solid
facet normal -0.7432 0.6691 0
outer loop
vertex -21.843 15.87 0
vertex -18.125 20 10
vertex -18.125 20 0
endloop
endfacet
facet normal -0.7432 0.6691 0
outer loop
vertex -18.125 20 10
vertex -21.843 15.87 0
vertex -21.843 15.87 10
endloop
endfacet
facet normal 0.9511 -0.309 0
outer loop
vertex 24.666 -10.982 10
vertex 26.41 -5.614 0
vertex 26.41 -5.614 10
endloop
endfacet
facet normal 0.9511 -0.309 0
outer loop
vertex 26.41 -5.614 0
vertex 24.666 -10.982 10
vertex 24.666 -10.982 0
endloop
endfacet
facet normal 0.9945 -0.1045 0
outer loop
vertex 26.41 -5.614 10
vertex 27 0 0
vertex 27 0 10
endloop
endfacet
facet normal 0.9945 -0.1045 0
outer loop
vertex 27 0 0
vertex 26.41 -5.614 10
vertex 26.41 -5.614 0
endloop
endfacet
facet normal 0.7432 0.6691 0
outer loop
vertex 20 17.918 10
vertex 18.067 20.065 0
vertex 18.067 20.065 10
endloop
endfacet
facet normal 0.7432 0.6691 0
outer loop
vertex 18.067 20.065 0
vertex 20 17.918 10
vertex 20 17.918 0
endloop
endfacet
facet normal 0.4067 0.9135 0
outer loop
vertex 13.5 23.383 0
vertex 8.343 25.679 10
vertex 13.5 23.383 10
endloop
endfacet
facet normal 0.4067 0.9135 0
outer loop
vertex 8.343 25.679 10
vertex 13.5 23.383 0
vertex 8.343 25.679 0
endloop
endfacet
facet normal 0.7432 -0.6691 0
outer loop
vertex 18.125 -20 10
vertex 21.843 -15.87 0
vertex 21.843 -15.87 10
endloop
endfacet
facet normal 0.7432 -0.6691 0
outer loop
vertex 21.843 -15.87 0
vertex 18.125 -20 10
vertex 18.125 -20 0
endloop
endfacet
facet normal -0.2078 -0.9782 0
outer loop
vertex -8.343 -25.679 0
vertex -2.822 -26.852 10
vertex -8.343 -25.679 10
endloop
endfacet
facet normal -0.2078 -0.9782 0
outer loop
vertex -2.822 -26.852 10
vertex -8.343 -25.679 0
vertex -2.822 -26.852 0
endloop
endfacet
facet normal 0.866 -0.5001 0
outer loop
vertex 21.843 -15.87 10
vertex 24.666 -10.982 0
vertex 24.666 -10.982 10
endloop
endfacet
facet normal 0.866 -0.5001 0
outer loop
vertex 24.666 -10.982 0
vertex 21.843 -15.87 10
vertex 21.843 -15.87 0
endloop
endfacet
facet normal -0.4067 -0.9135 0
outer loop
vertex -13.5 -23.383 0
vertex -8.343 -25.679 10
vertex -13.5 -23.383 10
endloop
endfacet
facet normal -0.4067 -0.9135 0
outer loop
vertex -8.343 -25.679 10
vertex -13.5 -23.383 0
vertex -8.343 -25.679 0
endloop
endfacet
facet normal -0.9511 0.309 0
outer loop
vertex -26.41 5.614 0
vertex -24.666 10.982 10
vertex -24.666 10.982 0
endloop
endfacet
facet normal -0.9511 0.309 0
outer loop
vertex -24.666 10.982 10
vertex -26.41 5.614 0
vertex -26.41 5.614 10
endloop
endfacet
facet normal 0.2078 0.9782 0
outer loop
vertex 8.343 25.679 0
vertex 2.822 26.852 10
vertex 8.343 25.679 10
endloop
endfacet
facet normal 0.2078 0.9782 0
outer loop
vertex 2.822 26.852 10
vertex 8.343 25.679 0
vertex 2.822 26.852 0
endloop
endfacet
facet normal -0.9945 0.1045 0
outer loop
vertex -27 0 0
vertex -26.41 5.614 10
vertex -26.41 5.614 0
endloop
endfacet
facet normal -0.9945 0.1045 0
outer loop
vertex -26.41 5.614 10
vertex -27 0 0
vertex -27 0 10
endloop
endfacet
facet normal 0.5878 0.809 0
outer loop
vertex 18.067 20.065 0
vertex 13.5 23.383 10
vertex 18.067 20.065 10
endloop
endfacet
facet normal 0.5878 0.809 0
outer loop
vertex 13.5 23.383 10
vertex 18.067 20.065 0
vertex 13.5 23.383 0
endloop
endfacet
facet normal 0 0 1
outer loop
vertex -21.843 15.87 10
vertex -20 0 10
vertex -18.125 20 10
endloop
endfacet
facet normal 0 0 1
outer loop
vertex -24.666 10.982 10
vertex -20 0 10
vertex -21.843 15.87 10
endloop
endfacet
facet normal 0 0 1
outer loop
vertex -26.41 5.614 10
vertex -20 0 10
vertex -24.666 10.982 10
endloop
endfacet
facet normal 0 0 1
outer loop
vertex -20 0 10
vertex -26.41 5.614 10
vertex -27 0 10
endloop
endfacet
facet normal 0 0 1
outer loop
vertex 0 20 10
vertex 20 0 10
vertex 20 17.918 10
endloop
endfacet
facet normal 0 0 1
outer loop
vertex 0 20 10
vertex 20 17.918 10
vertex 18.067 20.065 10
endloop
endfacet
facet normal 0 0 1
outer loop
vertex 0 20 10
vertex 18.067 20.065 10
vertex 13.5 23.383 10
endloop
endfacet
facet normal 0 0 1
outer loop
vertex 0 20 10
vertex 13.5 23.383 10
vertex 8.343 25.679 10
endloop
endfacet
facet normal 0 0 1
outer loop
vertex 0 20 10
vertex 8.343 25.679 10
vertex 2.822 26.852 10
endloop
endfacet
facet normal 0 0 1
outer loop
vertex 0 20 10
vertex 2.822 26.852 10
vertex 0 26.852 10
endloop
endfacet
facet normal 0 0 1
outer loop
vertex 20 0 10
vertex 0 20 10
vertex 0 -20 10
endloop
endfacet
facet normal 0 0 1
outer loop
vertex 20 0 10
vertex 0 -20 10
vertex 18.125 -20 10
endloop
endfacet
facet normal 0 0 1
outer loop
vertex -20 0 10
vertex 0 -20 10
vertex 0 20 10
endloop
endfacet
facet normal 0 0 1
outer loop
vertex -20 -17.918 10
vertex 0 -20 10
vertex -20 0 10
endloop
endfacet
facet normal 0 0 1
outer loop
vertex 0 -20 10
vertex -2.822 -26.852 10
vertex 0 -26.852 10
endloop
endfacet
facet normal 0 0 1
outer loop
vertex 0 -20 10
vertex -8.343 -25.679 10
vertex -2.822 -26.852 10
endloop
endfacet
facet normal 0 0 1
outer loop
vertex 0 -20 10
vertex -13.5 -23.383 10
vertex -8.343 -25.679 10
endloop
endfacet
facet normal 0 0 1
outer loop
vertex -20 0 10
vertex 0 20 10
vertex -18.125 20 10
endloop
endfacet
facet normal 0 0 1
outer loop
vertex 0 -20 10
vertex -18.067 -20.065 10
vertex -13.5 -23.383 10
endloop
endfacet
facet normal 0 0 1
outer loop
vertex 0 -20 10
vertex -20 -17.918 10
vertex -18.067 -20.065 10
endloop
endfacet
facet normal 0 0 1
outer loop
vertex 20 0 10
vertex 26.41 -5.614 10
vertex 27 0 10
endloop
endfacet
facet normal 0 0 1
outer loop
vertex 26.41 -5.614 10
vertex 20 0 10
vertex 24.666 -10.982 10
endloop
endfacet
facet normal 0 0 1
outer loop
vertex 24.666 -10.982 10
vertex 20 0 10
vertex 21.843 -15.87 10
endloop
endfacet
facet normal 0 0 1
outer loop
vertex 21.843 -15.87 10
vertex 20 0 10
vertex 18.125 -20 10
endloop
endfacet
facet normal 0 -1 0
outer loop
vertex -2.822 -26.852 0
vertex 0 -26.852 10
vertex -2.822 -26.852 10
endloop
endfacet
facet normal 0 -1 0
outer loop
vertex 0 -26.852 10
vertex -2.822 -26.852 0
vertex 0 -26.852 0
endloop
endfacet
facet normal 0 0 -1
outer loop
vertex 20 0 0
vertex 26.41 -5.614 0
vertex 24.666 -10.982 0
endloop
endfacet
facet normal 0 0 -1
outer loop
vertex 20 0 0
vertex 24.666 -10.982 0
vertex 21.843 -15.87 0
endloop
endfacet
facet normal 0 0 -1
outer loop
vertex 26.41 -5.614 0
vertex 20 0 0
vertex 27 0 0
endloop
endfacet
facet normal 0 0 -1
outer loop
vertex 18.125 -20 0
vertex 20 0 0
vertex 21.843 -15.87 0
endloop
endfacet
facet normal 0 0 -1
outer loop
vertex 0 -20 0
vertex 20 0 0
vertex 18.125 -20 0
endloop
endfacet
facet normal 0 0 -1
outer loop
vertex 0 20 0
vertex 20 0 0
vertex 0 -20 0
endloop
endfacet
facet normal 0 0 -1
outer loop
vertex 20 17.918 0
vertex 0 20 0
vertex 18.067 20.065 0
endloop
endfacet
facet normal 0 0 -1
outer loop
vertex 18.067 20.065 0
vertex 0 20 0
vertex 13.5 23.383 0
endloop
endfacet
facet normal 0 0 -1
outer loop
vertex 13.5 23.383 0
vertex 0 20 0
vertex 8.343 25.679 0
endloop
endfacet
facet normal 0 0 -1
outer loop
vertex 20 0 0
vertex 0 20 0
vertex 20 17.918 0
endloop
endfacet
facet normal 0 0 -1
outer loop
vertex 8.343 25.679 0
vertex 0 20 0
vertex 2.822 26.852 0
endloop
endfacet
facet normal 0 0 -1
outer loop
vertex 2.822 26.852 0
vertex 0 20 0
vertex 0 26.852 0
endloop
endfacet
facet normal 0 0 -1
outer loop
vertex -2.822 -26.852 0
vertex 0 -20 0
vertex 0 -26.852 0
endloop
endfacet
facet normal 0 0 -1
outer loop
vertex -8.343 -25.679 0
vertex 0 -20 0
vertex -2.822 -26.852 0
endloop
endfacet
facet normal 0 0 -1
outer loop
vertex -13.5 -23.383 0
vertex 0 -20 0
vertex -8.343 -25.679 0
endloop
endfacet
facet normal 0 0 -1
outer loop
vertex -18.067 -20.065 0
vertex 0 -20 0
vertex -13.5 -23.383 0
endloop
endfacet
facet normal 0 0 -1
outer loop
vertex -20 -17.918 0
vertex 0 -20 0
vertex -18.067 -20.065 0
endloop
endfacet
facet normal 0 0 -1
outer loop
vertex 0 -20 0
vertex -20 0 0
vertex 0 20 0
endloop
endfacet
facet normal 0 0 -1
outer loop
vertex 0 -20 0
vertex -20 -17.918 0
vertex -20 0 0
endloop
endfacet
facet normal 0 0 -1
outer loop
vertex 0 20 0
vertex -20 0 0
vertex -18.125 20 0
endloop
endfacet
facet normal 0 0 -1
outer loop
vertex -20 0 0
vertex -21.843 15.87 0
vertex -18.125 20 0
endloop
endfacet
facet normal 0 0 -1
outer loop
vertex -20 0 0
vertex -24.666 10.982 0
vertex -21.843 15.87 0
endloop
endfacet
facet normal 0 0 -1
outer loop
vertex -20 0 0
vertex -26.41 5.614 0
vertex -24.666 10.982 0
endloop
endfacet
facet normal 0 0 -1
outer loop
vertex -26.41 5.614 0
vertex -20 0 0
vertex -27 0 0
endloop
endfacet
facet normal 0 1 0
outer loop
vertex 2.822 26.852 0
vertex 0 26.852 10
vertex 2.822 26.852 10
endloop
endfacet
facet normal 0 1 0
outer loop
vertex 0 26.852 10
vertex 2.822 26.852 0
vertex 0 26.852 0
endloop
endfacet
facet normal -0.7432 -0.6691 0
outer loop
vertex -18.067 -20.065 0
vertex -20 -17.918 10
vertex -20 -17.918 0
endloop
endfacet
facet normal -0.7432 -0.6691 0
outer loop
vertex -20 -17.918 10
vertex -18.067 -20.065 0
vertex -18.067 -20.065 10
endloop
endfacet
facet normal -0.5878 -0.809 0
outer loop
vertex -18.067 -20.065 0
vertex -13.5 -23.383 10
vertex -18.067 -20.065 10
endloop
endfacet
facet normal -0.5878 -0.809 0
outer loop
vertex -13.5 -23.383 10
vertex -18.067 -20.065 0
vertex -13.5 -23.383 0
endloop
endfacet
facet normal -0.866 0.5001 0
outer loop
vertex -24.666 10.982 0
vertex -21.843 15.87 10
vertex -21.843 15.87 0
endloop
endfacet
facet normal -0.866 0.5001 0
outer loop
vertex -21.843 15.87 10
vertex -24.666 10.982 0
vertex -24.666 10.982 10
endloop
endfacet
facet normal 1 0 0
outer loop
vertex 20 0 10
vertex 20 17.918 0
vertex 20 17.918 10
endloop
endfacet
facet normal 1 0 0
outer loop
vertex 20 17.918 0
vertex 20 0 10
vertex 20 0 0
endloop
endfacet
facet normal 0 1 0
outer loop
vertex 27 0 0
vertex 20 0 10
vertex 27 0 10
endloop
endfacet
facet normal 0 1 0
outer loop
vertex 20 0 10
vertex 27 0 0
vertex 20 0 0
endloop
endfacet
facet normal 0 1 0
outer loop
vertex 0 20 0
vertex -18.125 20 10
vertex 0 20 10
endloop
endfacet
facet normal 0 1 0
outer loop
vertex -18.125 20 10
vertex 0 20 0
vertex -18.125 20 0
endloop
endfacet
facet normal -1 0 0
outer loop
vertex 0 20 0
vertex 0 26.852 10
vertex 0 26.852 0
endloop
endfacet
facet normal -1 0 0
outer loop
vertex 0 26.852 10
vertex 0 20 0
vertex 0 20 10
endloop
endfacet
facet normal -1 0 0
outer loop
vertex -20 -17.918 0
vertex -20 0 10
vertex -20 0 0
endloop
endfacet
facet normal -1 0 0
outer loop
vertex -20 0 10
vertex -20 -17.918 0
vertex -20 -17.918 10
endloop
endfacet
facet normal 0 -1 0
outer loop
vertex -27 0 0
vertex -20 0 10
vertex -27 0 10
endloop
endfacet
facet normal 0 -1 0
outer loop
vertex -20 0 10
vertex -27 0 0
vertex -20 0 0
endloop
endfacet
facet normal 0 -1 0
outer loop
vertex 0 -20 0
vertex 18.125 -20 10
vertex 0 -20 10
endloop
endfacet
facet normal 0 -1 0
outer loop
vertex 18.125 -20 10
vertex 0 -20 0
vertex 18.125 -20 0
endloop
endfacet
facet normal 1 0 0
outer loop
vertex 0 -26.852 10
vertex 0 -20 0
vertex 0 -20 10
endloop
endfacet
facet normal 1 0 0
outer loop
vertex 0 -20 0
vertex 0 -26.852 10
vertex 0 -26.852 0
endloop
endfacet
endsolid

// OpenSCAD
difference() {
	cylinder(h = 10, r = 27.0);
	rotate(a = 0) {
		translate(v = [20, 0, 0]) {
			rotate(a = 0) {
				cube(size = [20, 20, 12]);
			}
		}
	}
	rotate(a = 90) {
		translate(v = [20, 0, 0]) {
			rotate(a = 0) {
				cube(size = [20, 20, 12]);
			}
		}
	}
	rotate(a = 180) {
		translate(v = [20, 0, 0]) {
			rotate(a = 0) {
				cube(size = [20, 20, 12]);
			}
		}
	}
	rotate(a = 270) {
		translate(v = [20, 0, 0]) {
			rotate(a = 0) {
				cube(size = [20, 20, 12]);
			}
		}
	}
}
